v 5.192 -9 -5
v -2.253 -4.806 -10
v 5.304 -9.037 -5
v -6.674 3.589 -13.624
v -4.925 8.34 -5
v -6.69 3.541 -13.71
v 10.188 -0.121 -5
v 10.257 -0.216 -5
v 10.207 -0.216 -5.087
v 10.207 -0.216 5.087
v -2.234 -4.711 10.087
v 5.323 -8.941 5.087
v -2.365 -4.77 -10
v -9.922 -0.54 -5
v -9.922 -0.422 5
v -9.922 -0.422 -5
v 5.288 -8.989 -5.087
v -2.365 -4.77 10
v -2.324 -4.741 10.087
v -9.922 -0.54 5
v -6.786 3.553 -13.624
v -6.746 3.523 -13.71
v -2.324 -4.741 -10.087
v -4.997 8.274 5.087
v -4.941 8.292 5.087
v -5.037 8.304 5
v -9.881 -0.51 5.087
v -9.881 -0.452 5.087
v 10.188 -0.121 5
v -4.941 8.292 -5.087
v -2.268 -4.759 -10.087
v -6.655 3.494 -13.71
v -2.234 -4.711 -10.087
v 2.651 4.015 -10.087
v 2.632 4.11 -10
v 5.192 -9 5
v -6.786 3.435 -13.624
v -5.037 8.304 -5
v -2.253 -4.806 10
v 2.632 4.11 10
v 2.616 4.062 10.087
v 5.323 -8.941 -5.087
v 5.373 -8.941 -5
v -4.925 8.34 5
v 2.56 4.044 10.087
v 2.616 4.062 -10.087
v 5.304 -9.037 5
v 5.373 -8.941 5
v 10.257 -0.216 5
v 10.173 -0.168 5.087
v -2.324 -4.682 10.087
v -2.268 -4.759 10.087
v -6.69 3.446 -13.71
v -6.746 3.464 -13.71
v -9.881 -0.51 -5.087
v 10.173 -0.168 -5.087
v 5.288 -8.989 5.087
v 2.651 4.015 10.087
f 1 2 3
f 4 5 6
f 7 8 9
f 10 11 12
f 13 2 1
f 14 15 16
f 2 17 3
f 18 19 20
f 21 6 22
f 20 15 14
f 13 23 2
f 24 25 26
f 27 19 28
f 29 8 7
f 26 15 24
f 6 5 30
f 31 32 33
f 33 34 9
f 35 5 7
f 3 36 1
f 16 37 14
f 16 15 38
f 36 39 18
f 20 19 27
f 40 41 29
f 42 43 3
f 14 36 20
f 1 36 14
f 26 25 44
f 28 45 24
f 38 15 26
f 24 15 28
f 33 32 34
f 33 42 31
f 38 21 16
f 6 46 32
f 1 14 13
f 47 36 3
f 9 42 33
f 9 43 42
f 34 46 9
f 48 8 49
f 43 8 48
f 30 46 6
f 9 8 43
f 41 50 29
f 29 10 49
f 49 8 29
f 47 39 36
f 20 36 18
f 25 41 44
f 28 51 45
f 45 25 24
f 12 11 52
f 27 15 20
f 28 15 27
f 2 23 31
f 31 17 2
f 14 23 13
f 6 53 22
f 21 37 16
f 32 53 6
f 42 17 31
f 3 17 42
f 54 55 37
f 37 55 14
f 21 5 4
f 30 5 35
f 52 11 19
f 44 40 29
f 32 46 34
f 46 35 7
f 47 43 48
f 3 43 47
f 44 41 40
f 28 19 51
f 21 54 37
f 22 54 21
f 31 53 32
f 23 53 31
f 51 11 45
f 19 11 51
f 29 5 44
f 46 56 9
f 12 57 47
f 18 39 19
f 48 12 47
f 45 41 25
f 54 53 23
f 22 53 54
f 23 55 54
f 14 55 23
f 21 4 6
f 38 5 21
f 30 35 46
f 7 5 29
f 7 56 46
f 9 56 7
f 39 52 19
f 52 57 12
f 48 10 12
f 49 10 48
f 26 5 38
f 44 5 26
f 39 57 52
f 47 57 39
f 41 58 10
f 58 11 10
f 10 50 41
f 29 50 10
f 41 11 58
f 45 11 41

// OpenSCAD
// Auto-generated OpenSCAD file

    inner_points = 10*[[0.5272841921394986, -0.8941494324725834, -0.5000000000002047], [1.0157495787801158, -0.02156616077066012, -0.5000000000002183], [-0.9840743682826907, -0.048102565072366016, 0.5000000000002183], [-0.49560898164207345, 0.8244807066295572, 0.5000000000002047], [-0.22839508807181572, -0.47112599877236716, -0.9999999999999931], [0.5272841921397184, -0.8941494324726909, 0.4999999999997952], [0.2600702985688014, 0.401457272929556, -1.0000000000000067], [1.0157495787803354, -0.021566160770767534, 0.49999999999978156], [-0.9840743682829104, -0.0481025650722586, -0.49999999999978156], [-0.22839508807137623, -0.4711259987725822, 1.0000000000000067], [-0.4956089816422933, 0.8244807066296647, -0.4999999999997952], [0.26007029856924085, 0.4014572729293411, 0.9999999999999931], [-0.6705068091423759, 0.3493759475629592, -1.3623724356956024]];

    outer_points = 10*[[-0.5871016774818598, -0.035032029076049194, -0.9508335170979203], [-1.1127273597817333, 0.035032029076049194, -0.10300766831643143], [1.1127273597817333, -0.035032029076049194, 0.10300766831643143], [0.5871016774818598, 0.035032029076049194, 0.9508335170979203], [-0.1941165129402417, -0.8989291704166398, -0.6358027414048893], [-0.1301723233916815, 0.8288651122645414, -0.7389437000837753], [-0.7197421952401151, -0.8288651122645414, 0.21202310737659946], [-0.6557980056915549, 0.8989291704166398, 0.10888214869771351], [0.6557980056915549, -0.8989291704166398, -0.10888214869771351], [0.7197421952401151, 0.8288651122645414, -0.21202310737659946], [0.1301723233916815, -0.8288651122645414, 0.7389437000837753], [0.1941165129402417, 0.8989291704166398, 0.6358027414048893], [-0.05807720084257707, -1.5692662035184195, 0.09367759939690216]];

    // Convex hull for inner set (I)
    module inner_hull() {
        hull() {
            for (p = inner_points) {
                translate(p) sphere(r=0.1);
            }
        }
    }

    // Convex hull for outer set (O) minus inner hull (O \ I)
    module outer_minus_inner() {
        difference() {
            hull() {
                for (p = outer_points) {
                    translate(p) sphere(r=0.1);
                }
            }
            inner_hull(); // Subtract inner hull
        }
    }

    // Convex hull for outer set (O) minus all translated inner hulls
    module outer_minus_AllTranslationInner() {
        difference() {
            hull() {
                for (p = outer_points) {
                    translate(p) sphere(r=0.1);
                }
            }
            hull() {
                translate([0,0,50]) inner_hull();
                translate([0,0,-50]) inner_hull();
            }; // Subtract translated inner hulls
        }
    }

    // Difference between outer_minus_inner and outer_minus_AllTranslationInner
    module outer_minus_inner_diff() {
        difference() {
            // Outer minus inner
            difference() {
                hull() {
                    for (p = outer_points) {
                        translate(p) sphere(r=0.1);
                    }
                }
                inner_hull();
            }

            // Subtract Outer minus AllTranslationInner
            difference() {
                hull() {
                    for (p = outer_points) {
                        translate(p) sphere(r=0.1);
                    }
                }
                hull() {
                    translate([0,0,50]) inner_hull();
                    translate([0,0,-50]) inner_hull();
                };
            }
        }
    }

    // Rendering all with colors applied
    color([1, 0, 0, 0.5]) inner_hull(); // Transparent red
    
